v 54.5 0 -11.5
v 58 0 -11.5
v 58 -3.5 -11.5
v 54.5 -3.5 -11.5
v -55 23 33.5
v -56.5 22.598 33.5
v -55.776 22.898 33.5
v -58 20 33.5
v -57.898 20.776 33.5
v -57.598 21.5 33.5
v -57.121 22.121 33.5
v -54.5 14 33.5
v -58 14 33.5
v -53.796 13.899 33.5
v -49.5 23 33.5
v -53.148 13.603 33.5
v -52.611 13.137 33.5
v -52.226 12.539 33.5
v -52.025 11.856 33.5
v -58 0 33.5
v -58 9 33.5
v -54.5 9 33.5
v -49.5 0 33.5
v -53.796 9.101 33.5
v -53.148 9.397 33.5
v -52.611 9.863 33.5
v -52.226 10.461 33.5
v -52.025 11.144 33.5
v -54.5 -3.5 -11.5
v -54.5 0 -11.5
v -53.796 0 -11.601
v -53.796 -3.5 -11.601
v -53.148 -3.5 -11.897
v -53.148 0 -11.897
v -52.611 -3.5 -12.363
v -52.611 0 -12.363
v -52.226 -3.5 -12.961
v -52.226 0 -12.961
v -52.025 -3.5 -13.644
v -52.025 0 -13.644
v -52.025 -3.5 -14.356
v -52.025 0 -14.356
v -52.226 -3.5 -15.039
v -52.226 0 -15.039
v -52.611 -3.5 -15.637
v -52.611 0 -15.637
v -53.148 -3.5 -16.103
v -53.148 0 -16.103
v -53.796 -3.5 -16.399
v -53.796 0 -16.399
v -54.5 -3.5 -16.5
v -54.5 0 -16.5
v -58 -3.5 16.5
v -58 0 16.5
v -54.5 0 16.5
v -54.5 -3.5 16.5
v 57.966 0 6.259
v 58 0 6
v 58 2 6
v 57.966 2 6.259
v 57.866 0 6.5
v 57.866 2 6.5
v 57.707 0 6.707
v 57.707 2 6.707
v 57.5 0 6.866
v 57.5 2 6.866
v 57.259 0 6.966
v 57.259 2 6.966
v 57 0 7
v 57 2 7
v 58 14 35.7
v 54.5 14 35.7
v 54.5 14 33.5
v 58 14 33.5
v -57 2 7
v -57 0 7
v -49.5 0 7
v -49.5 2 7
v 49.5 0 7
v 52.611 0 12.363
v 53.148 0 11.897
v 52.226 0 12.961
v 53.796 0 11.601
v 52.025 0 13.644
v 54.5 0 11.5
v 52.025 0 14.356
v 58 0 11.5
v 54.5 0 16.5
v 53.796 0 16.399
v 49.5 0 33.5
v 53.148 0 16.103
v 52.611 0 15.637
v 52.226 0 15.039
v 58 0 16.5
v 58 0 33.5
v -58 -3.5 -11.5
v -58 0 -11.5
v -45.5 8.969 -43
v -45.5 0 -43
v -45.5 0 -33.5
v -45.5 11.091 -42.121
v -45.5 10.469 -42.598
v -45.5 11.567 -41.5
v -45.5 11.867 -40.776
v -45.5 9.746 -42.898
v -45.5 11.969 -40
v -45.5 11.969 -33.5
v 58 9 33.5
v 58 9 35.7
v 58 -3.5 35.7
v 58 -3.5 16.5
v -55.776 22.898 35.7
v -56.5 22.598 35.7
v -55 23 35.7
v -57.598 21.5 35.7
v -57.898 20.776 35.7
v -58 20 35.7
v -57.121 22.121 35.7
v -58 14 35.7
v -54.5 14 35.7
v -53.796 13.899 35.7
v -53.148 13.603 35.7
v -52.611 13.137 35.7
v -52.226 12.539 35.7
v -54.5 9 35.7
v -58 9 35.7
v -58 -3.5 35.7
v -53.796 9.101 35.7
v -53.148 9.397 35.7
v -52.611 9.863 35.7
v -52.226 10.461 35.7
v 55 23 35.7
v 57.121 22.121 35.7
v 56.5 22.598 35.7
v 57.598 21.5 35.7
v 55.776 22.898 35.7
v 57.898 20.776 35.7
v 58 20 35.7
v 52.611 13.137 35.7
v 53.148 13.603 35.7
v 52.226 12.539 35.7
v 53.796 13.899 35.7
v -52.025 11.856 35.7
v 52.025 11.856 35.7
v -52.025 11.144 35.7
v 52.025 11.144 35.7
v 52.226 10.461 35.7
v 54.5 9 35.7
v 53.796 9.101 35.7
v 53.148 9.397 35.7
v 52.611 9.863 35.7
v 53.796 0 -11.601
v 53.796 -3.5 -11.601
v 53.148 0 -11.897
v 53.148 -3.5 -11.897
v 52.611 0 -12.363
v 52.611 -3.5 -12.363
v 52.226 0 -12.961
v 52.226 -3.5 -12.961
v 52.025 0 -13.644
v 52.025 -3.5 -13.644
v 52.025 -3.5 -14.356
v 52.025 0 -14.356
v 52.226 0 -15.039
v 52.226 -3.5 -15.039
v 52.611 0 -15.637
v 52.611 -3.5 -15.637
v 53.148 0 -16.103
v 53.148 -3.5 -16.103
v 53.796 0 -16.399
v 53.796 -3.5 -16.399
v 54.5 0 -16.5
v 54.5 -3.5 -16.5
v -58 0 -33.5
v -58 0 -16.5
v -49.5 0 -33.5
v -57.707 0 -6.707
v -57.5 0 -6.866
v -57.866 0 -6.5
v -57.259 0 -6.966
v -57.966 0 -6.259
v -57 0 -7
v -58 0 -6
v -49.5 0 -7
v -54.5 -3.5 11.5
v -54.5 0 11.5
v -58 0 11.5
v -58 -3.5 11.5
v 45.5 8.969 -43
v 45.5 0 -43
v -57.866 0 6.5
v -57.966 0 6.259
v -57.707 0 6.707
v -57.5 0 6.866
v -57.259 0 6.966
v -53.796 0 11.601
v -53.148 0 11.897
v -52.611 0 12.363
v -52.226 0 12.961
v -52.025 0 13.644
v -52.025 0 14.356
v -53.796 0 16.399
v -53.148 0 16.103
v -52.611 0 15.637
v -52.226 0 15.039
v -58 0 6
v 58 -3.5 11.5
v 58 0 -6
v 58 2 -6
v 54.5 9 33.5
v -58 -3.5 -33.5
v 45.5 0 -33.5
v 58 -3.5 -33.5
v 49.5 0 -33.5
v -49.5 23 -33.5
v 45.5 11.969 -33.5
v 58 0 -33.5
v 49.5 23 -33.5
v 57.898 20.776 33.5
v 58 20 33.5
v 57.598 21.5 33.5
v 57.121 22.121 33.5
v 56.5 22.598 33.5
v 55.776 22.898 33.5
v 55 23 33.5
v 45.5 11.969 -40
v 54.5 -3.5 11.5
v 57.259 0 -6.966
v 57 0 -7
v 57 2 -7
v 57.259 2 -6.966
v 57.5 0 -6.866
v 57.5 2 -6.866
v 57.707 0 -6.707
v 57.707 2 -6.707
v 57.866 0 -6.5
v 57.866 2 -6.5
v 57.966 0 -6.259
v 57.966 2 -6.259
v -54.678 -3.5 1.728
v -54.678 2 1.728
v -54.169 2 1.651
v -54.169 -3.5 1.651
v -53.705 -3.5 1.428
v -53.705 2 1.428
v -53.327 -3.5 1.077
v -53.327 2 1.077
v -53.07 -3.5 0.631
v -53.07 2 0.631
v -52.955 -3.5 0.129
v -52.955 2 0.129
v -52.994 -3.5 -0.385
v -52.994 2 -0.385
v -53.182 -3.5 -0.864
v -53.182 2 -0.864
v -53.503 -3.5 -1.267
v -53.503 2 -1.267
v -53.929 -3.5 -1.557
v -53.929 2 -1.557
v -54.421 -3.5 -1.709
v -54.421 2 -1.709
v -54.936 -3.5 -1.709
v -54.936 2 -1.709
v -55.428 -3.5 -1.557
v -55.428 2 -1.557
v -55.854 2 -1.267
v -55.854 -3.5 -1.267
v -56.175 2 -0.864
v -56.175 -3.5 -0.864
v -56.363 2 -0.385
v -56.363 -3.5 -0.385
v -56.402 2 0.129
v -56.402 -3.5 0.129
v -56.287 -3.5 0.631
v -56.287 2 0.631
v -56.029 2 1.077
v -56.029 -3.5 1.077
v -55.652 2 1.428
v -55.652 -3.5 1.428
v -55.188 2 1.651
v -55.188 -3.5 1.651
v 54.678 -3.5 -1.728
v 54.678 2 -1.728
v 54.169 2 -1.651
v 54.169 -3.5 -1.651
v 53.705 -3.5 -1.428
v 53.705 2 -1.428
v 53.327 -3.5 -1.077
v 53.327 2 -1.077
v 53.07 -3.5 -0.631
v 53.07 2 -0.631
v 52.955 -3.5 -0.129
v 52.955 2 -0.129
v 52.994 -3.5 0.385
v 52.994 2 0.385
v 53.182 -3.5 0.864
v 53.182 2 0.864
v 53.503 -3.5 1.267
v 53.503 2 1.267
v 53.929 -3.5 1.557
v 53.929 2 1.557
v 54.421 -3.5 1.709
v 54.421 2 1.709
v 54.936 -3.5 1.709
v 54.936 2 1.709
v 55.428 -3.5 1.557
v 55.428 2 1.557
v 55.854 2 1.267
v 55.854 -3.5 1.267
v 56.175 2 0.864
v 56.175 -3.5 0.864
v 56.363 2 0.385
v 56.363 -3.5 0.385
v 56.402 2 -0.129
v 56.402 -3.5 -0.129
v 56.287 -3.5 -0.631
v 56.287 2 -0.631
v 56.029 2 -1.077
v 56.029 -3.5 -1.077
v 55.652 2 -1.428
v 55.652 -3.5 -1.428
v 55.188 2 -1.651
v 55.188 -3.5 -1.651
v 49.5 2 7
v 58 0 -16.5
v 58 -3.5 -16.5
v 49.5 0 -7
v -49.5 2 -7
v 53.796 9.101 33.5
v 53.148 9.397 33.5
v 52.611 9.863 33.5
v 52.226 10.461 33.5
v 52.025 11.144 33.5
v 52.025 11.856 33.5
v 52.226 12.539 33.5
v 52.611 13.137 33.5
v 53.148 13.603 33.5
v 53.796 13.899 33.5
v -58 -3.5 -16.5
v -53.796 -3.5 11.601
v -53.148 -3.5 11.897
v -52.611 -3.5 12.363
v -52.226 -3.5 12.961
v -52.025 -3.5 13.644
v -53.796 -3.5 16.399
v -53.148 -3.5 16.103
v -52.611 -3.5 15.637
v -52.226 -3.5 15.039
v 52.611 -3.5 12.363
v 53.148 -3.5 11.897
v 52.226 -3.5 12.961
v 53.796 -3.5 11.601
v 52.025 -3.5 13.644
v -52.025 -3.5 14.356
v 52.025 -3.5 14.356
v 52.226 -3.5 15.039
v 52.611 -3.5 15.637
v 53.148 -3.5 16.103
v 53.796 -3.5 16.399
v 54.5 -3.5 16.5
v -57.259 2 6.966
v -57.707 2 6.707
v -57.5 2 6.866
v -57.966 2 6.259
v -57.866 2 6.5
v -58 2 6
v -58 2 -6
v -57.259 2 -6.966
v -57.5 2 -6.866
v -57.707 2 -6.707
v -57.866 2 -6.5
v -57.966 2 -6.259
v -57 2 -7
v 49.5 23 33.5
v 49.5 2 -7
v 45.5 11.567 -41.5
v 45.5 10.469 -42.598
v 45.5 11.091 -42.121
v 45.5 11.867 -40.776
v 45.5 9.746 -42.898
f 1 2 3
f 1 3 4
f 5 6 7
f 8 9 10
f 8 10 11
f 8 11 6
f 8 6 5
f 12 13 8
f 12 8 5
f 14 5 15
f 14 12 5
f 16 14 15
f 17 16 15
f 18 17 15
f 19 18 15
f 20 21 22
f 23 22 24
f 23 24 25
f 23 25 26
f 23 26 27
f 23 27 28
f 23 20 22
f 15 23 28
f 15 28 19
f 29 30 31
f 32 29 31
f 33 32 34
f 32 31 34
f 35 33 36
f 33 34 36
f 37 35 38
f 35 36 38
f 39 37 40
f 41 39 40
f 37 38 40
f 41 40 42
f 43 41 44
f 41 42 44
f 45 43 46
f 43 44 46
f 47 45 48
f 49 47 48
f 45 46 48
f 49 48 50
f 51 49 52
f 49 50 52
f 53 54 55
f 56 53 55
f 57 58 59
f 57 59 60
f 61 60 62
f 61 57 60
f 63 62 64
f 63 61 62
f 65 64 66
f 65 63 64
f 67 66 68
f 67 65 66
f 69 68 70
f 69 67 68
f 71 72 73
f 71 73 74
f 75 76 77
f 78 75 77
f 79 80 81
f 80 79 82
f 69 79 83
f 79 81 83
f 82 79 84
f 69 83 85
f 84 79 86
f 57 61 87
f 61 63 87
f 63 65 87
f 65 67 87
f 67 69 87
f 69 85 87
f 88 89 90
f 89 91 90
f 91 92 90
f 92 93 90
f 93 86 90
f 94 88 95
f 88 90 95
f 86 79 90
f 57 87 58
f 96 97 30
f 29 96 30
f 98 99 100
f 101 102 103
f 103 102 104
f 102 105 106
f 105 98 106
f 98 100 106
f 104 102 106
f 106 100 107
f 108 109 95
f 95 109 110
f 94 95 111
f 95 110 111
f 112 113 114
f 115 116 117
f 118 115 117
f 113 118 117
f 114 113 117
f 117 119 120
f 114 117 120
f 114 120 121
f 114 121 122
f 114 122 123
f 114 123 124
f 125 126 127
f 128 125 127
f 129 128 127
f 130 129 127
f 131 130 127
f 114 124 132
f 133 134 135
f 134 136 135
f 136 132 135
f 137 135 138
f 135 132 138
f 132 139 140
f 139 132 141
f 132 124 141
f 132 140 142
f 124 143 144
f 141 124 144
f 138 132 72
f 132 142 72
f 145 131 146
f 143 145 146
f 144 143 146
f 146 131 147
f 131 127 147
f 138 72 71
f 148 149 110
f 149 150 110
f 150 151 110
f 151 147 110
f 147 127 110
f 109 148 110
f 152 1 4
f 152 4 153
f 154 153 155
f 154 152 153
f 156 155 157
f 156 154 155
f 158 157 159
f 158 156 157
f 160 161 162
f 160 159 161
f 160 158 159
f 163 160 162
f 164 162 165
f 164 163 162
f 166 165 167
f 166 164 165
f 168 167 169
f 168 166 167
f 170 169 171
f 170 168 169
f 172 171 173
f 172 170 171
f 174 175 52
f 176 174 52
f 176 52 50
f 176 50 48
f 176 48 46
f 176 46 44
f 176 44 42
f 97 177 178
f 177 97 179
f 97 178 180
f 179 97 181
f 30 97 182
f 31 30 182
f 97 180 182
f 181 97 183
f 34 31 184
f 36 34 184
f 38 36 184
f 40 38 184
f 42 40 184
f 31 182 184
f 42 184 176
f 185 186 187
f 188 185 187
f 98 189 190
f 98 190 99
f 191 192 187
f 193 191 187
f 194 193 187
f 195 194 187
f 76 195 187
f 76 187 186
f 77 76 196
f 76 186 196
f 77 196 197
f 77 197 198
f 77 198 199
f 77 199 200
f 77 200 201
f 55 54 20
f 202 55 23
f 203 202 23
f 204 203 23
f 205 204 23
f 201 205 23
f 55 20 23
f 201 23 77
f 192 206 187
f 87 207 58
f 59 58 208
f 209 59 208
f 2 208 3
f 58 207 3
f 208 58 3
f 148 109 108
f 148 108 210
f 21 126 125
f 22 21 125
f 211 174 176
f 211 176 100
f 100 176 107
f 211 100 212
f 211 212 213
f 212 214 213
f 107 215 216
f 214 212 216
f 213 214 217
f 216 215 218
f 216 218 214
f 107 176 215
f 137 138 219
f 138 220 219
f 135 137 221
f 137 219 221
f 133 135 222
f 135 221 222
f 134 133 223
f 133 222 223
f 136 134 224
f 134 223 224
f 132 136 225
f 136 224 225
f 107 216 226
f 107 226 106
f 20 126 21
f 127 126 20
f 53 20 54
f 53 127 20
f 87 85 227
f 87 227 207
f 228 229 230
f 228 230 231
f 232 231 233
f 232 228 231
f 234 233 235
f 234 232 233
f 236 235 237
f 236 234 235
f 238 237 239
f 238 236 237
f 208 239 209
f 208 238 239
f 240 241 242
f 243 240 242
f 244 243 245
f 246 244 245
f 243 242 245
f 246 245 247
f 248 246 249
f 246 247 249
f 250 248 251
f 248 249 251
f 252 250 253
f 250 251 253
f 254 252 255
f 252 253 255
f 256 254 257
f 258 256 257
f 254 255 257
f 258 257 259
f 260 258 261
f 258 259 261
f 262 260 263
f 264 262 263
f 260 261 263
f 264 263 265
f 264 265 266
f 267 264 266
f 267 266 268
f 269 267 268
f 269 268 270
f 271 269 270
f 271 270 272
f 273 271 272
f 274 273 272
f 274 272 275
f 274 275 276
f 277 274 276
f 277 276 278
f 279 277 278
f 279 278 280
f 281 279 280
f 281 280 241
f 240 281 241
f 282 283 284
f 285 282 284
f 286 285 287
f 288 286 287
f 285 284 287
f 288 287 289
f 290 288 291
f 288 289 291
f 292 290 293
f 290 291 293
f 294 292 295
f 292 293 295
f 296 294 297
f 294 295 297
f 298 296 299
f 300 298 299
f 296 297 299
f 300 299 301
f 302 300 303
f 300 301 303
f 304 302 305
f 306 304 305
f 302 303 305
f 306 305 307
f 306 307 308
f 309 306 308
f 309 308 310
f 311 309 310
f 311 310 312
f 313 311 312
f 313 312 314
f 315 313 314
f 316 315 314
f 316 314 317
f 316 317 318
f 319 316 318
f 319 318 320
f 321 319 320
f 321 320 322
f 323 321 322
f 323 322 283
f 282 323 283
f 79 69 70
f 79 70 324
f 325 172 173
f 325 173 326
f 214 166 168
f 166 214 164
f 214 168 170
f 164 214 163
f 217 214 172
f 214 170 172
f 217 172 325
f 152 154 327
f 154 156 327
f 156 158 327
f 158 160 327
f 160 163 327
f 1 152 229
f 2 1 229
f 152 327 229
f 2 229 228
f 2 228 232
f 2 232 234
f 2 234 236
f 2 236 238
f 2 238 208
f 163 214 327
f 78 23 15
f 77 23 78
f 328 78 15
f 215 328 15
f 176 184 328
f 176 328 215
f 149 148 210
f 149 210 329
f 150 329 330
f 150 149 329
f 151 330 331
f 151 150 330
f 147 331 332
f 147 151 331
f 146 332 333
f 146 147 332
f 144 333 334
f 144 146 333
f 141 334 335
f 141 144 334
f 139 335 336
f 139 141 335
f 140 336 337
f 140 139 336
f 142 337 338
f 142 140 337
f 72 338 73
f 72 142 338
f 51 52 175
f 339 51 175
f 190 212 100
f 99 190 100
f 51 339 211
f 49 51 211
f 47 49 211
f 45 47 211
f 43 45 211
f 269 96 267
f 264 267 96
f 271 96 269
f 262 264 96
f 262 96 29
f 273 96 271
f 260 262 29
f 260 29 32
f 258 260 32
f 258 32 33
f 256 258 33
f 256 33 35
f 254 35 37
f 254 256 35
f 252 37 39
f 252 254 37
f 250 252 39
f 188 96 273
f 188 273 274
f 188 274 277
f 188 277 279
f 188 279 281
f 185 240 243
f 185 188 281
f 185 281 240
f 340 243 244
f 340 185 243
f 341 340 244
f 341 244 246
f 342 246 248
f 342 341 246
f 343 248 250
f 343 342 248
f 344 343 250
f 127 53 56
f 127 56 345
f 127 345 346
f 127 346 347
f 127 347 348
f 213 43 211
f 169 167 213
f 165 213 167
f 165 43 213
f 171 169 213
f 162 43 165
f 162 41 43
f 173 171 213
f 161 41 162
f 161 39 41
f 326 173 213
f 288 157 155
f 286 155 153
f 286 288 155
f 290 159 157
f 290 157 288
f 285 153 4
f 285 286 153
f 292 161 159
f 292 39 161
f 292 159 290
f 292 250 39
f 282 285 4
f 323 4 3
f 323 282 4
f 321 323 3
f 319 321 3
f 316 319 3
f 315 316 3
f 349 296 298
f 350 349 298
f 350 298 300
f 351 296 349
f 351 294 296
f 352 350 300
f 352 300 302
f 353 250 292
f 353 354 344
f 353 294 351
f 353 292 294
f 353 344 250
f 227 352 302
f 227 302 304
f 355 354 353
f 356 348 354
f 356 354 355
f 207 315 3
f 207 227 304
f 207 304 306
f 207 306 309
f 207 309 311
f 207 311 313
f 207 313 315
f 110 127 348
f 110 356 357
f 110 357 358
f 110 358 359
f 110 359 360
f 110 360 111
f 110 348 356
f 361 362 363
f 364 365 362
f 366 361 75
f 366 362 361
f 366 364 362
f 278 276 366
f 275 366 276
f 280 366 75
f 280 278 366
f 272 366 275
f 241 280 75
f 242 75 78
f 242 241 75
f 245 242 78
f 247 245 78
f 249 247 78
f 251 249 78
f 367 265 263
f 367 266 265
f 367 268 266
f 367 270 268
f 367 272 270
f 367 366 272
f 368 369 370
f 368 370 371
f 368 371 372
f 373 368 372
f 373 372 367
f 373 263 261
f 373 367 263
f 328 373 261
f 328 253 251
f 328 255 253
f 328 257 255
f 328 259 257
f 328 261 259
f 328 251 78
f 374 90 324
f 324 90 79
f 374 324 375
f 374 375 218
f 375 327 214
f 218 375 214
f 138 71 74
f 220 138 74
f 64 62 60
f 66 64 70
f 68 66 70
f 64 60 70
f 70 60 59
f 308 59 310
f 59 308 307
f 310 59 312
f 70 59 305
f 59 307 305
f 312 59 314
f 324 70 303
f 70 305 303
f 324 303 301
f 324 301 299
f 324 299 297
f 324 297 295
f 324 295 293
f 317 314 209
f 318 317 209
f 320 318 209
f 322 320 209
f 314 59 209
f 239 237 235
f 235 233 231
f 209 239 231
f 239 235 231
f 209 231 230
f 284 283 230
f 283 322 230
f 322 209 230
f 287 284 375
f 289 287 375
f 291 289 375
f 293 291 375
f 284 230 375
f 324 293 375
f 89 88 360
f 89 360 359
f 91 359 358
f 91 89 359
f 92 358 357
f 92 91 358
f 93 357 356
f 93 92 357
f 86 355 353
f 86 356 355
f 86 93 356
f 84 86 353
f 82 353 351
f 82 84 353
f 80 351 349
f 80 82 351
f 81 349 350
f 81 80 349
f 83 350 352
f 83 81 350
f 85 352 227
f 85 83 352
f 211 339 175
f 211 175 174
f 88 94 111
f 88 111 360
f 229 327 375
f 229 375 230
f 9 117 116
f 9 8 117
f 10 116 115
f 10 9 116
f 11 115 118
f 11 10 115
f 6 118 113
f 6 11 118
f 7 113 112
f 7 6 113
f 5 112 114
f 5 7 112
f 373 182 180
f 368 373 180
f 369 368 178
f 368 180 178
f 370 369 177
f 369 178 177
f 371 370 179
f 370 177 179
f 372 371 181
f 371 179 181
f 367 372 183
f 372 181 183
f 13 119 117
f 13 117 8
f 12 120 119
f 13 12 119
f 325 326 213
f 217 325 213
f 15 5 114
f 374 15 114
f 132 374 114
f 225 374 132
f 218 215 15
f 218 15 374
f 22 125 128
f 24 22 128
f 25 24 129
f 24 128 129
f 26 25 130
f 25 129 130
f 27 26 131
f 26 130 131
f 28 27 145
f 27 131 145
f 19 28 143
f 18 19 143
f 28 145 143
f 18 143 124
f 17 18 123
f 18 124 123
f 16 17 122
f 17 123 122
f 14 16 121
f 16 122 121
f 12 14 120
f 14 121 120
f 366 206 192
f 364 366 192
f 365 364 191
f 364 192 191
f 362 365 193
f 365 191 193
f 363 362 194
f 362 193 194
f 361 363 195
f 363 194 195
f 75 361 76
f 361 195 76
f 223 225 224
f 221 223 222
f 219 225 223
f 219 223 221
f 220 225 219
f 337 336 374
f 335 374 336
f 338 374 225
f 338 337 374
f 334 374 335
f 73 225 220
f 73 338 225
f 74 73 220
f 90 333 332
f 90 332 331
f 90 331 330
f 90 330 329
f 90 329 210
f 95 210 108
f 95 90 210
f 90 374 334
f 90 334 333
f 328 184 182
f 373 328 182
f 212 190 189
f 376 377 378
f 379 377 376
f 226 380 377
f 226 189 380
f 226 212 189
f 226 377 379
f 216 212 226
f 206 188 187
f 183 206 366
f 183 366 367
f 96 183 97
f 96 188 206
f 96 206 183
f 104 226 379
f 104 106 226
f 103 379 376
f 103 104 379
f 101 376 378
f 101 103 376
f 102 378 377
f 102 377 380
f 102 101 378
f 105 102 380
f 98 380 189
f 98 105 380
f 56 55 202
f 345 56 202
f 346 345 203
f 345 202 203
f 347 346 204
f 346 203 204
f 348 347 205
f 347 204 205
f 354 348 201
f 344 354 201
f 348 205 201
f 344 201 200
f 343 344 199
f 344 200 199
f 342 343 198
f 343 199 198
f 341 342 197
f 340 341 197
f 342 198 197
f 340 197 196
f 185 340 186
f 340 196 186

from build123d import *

# Parameters (mm, degrees)
SKETCH1_W           = 99
SKETCH1_H           = 67
BOSS_EXTRUDE1_DEPTH = 23
SKETCH2_W           = 116
SKETCH2_H           = 69.2
BOSS_EXTRUDE2_DEPTH = 3.5
SKETCH3_W           = 116
SKETCH3_H           = 2.2
BOSS_EXTRUDE3_DEPTH = 23
SKETCH4_W           = 91
SKETCH4_H           = 11.969413233
BOSS_EXTRUDE4_DEPTH = 9.5
FILLET1_R           = 3
FILLET2_R           = 3
CUT_EXTRUDE1_DEPTH  = 9.5
CUT_EXTRUDE2_DEPTH  = 9.5
BOSS_EXTRUDE5_DEPTH = 2
SKETCH9_R           = 1.727966507
CUT_EXTRUDE3_DEPTH  = 76.193084788


with BuildPart() as part:
    # Sketch1 → Boss-Extrude1 (new body)
    with BuildSketch(Plane(origin=(0, 0, 0), x_dir=(1, 0, 0), z_dir=(0, 1, 0))):
        Rectangle(SKETCH1_W, SKETCH1_H)
    extrude(amount=BOSS_EXTRUDE1_DEPTH)

    # Sketch2 → Boss-Extrude2 (add)
    with BuildSketch(Plane.XZ):
        with Locations((0, 1.1)):
            Rectangle(SKETCH2_W, SKETCH2_H)
    extrude(amount=BOSS_EXTRUDE2_DEPTH)

    # Sketch3 → Boss-Extrude3 (add)
    with BuildSketch(Plane(origin=(0, 0, 0), x_dir=(1, 0, 0), z_dir=(0, 1, 0))):
        with Locations((0, -34.6)):
            Rectangle(SKETCH3_W, SKETCH3_H)
    extrude(amount=BOSS_EXTRUDE3_DEPTH)

    # Sketch4 → Boss-Extrude4 (add)
    with BuildSketch(Plane(origin=(0, 0, -33.5), x_dir=(-1, 0, 0), z_dir=(0, 0, -1))):
        with Locations((0, 5.984706617)):
            Rectangle(SKETCH4_W, SKETCH4_H)
    extrude(amount=BOSS_EXTRUDE4_DEPTH)

    # Fillet1
    fillet1_edges = [part.edges().sort_by_distance(p)[0] for p in [
        (0, 11.969413233, -43),
    ]]
    fillet(fillet1_edges, radius=FILLET1_R)

    # Fillet2
    fillet2_edges = [part.edges().sort_by_distance(p)[0] for p in [
        (58, 23, 34.6),
        (-58, 23, 34.6),
    ]]
    fillet(fillet2_edges, radius=FILLET2_R)

    # Sketch5 → Cut-Extrude1 (cut)
    with BuildSketch(Plane.XY.offset(35.7)):
        with BuildLine():
            Line((-54.5, 14), (-58, 14))
            Line((-58, 14), (-58, 9))
            Line((-58, 9), (-54.5, 9))
            ThreePointArc((-54.5, 9), (-52, 11.5), (-54.5, 14))
        make_face()
        with BuildLine():
            Line((58, 9), (54.5, 9))
            ThreePointArc((54.5, 9), (52, 11.5), (54.5, 14))
            Line((54.5, 14), (58, 14))
            Line((58, 14), (58, 9))
        make_face()
    extrude(amount=-CUT_EXTRUDE1_DEPTH, mode=Mode.SUBTRACT)

    # Sketch6 → Cut-Extrude2 (cut)
    with BuildSketch(Plane(origin=(0, 0, 0), x_dir=(1, 0, 0), z_dir=(0, 1, 0))):
        with BuildLine():
            Line((54.5, 16.5), (58, 16.5))
            Line((58, 16.5), (58, 11.5))
            Line((58, 11.5), (54.5, 11.5))
            ThreePointArc((54.5, 11.5), (52, 14), (54.5, 16.5))
        make_face()
        with BuildLine():
            Line((54.5, -11.5), (58, -11.5))
            Line((58, -11.5), (58, -16.5))
            Line((58, -16.5), (54.5, -16.5))
            ThreePointArc((54.5, -16.5), (52, -14), (54.5, -11.5))
        make_face()
        with BuildLine():
            Line((-58, -16.5), (-54.5, -16.5))
            ThreePointArc((-54.5, -16.5), (-52, -14), (-54.5, -11.5))
            Line((-54.5, -11.5), (-58, -11.5))
            Line((-58, -11.5), (-58, -16.5))
        make_face()
        with BuildLine():
            Line((-58, 11.5), (-54.5, 11.5))
            ThreePointArc((-54.5, 11.5), (-52, 14), (-54.5, 16.5))
            Line((-54.5, 16.5), (-58, 16.5))
            Line((-58, 16.5), (-58, 11.5))
        make_face()
    extrude(amount=-CUT_EXTRUDE2_DEPTH, mode=Mode.SUBTRACT)

    # Sketch8 → Boss-Extrude5 (add)
    with BuildSketch(Plane(origin=(0, 0, 0), x_dir=(1, 0, 0), z_dir=(0, 1, 0))):
        with BuildLine():
            Line((-57, -7), (-49.5, -7))
            Line((-49.5, -7), (-49.5, 7))
            Line((-49.5, 7), (-57, 7))
            ThreePointArc((-57, 7), (-57.707106781, 6.707106781), (-58, 6))
            Line((-58, 6), (-58, -6))
            ThreePointArc((-58, -6), (-57.707106781, -6.707106781), (-57, -7))
        make_face()
        with BuildLine():
            Line((49.5, -7), (49.5, 7))
            Line((49.5, 7), (57, 7))
            ThreePointArc((57, 7), (57.707106781, 6.707106781), (58, 6))
            Line((58, 6), (58, -6))
            ThreePointArc((58, -6), (57.707106781, -6.707106781), (57, -7))
            Line((57, -7), (49.5, -7))
        make_face()
    extrude(amount=BOSS_EXTRUDE5_DEPTH)

    # Sketch9 → Cut-Extrude3 (cut, through all)
    with BuildSketch(Plane(origin=(0, 2, 0), x_dir=(1, 0, 0), z_dir=(0, 1, 0))):
        with Locations(Location((-54.678466494, 0, 0), (0, 0, 270))):
            Circle(SKETCH9_R)
        with Locations(Location((54.678466494, 0, 0), (0, 0, 90))):
            Circle(SKETCH9_R)
    extrude(amount=-CUT_EXTRUDE3_DEPTH, mode=Mode.SUBTRACT)


solid = part.part
